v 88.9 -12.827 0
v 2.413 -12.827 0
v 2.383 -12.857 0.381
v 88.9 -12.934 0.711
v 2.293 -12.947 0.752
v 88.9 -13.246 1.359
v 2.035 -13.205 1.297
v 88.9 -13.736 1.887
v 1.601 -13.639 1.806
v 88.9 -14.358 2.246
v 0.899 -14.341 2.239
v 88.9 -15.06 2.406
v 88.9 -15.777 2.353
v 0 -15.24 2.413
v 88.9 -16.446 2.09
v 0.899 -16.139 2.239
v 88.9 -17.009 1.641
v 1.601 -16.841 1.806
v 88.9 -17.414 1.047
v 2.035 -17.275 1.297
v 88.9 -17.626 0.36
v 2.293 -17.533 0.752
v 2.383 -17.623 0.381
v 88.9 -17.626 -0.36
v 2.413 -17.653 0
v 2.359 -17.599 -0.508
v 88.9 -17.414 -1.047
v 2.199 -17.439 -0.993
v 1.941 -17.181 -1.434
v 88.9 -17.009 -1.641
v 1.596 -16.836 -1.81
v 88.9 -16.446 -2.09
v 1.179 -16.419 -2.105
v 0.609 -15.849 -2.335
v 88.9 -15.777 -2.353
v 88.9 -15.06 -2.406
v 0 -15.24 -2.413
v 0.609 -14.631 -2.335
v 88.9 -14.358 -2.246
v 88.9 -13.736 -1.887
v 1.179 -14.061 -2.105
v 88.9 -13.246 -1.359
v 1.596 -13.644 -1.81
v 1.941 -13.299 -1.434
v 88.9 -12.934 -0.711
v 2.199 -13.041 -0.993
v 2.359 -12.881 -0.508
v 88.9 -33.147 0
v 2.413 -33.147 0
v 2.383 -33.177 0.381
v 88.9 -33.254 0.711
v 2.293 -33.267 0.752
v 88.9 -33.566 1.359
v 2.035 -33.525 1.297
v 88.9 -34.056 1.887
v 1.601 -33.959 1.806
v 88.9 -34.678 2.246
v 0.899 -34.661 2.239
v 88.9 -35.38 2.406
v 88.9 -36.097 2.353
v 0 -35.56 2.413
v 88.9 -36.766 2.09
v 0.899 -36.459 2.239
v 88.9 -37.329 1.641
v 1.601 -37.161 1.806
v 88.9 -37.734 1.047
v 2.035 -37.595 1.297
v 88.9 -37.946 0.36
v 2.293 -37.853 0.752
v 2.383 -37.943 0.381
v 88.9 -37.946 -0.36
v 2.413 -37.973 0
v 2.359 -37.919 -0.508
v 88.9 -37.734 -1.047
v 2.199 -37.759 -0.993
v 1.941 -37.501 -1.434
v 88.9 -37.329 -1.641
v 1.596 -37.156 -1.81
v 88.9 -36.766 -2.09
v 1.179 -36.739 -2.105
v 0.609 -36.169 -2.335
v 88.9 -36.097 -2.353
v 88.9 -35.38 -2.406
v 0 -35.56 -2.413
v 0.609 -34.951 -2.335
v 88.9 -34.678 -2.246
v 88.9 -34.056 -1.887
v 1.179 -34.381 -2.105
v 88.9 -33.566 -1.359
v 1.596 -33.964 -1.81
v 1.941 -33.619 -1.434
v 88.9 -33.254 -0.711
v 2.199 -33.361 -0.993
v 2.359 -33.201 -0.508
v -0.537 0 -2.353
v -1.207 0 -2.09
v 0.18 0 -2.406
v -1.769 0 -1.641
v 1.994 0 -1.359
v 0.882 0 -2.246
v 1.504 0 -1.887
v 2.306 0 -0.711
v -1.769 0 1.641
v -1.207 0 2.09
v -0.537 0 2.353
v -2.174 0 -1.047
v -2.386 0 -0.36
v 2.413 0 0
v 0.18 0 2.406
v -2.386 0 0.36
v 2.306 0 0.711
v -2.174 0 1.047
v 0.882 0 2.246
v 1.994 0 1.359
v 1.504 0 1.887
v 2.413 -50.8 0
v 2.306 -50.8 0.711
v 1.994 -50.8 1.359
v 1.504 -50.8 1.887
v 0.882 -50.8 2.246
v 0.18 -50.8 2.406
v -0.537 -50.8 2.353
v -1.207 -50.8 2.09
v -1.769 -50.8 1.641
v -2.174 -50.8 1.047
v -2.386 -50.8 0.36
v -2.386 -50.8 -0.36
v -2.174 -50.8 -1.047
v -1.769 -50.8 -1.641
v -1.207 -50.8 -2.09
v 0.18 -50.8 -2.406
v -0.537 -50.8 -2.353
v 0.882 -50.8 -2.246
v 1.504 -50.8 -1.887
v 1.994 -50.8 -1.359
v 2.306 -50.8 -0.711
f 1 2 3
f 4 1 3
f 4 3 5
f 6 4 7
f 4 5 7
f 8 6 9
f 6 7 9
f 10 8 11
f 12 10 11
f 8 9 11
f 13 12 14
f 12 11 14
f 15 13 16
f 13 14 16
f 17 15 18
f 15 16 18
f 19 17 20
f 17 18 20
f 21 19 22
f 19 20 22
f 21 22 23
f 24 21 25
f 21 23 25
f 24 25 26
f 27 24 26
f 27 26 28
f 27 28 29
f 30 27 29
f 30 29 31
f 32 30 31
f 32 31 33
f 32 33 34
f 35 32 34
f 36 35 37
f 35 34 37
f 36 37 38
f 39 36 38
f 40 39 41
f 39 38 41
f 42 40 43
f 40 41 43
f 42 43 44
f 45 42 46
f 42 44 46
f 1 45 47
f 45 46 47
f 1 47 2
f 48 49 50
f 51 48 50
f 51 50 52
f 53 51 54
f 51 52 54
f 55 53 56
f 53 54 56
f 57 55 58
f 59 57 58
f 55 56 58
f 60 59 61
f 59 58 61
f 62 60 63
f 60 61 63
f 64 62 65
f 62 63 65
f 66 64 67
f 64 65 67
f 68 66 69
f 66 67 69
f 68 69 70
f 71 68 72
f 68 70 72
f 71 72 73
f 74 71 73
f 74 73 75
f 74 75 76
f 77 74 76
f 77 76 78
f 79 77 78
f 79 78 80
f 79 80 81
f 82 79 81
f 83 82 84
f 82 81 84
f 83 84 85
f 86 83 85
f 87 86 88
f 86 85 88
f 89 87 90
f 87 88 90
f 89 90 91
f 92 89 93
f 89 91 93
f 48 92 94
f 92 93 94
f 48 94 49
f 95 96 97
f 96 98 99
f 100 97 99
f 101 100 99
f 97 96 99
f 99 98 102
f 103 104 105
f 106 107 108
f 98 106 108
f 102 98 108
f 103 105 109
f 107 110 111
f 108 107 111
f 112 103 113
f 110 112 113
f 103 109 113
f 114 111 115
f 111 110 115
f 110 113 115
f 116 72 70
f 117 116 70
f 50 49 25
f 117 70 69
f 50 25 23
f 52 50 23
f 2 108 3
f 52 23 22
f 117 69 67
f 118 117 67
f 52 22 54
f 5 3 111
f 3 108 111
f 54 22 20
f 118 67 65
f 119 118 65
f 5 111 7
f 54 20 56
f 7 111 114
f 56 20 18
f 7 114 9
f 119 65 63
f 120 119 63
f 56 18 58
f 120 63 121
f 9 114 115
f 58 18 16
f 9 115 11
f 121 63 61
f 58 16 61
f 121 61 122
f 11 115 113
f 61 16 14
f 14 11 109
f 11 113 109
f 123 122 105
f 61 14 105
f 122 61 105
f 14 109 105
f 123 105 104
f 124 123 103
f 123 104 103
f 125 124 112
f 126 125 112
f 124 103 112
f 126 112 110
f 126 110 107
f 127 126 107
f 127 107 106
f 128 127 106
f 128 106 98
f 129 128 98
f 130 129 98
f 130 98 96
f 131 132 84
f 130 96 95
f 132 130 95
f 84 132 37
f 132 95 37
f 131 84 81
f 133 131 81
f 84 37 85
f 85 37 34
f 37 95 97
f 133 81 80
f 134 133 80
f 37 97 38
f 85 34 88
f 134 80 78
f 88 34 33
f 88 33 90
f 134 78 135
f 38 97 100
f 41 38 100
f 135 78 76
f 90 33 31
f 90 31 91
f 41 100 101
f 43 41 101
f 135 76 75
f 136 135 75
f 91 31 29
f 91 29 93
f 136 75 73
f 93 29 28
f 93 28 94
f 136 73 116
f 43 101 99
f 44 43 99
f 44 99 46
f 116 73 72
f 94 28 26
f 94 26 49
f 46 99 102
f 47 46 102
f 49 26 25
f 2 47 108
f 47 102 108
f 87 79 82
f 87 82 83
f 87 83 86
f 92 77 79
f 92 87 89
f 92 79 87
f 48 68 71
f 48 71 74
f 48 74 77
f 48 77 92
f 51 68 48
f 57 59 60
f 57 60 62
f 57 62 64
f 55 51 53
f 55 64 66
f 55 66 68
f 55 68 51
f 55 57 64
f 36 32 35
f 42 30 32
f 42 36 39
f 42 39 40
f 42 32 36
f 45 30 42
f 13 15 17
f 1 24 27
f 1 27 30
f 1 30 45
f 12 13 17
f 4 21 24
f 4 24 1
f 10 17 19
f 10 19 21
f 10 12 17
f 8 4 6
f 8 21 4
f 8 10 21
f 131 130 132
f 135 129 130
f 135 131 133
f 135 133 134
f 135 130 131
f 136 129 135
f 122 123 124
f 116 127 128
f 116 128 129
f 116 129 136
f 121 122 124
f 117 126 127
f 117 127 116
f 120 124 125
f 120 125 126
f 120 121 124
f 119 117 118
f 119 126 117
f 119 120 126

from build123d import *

# Parameters (mm, degrees)
F0_R     = 2.413
F1_DEPTH = 50.8
F2_R     = 2.413
F3_DEPTH = 88.9


with BuildPart() as f1:
    # F0 (on Front) → F1 (new body)
    with BuildSketch(Plane.XZ):
        Circle(F0_R)
    extrude(amount=F1_DEPTH)

    # F2 (on Right) → F3 (join)
    with BuildSketch(Plane.YZ):
        with Locations((-35.56, 0)):
            Circle(F2_R)
        with Locations((-15.24, 0)):
            Circle(F2_R)
    extrude(amount=F3_DEPTH)


solid = f1.part
